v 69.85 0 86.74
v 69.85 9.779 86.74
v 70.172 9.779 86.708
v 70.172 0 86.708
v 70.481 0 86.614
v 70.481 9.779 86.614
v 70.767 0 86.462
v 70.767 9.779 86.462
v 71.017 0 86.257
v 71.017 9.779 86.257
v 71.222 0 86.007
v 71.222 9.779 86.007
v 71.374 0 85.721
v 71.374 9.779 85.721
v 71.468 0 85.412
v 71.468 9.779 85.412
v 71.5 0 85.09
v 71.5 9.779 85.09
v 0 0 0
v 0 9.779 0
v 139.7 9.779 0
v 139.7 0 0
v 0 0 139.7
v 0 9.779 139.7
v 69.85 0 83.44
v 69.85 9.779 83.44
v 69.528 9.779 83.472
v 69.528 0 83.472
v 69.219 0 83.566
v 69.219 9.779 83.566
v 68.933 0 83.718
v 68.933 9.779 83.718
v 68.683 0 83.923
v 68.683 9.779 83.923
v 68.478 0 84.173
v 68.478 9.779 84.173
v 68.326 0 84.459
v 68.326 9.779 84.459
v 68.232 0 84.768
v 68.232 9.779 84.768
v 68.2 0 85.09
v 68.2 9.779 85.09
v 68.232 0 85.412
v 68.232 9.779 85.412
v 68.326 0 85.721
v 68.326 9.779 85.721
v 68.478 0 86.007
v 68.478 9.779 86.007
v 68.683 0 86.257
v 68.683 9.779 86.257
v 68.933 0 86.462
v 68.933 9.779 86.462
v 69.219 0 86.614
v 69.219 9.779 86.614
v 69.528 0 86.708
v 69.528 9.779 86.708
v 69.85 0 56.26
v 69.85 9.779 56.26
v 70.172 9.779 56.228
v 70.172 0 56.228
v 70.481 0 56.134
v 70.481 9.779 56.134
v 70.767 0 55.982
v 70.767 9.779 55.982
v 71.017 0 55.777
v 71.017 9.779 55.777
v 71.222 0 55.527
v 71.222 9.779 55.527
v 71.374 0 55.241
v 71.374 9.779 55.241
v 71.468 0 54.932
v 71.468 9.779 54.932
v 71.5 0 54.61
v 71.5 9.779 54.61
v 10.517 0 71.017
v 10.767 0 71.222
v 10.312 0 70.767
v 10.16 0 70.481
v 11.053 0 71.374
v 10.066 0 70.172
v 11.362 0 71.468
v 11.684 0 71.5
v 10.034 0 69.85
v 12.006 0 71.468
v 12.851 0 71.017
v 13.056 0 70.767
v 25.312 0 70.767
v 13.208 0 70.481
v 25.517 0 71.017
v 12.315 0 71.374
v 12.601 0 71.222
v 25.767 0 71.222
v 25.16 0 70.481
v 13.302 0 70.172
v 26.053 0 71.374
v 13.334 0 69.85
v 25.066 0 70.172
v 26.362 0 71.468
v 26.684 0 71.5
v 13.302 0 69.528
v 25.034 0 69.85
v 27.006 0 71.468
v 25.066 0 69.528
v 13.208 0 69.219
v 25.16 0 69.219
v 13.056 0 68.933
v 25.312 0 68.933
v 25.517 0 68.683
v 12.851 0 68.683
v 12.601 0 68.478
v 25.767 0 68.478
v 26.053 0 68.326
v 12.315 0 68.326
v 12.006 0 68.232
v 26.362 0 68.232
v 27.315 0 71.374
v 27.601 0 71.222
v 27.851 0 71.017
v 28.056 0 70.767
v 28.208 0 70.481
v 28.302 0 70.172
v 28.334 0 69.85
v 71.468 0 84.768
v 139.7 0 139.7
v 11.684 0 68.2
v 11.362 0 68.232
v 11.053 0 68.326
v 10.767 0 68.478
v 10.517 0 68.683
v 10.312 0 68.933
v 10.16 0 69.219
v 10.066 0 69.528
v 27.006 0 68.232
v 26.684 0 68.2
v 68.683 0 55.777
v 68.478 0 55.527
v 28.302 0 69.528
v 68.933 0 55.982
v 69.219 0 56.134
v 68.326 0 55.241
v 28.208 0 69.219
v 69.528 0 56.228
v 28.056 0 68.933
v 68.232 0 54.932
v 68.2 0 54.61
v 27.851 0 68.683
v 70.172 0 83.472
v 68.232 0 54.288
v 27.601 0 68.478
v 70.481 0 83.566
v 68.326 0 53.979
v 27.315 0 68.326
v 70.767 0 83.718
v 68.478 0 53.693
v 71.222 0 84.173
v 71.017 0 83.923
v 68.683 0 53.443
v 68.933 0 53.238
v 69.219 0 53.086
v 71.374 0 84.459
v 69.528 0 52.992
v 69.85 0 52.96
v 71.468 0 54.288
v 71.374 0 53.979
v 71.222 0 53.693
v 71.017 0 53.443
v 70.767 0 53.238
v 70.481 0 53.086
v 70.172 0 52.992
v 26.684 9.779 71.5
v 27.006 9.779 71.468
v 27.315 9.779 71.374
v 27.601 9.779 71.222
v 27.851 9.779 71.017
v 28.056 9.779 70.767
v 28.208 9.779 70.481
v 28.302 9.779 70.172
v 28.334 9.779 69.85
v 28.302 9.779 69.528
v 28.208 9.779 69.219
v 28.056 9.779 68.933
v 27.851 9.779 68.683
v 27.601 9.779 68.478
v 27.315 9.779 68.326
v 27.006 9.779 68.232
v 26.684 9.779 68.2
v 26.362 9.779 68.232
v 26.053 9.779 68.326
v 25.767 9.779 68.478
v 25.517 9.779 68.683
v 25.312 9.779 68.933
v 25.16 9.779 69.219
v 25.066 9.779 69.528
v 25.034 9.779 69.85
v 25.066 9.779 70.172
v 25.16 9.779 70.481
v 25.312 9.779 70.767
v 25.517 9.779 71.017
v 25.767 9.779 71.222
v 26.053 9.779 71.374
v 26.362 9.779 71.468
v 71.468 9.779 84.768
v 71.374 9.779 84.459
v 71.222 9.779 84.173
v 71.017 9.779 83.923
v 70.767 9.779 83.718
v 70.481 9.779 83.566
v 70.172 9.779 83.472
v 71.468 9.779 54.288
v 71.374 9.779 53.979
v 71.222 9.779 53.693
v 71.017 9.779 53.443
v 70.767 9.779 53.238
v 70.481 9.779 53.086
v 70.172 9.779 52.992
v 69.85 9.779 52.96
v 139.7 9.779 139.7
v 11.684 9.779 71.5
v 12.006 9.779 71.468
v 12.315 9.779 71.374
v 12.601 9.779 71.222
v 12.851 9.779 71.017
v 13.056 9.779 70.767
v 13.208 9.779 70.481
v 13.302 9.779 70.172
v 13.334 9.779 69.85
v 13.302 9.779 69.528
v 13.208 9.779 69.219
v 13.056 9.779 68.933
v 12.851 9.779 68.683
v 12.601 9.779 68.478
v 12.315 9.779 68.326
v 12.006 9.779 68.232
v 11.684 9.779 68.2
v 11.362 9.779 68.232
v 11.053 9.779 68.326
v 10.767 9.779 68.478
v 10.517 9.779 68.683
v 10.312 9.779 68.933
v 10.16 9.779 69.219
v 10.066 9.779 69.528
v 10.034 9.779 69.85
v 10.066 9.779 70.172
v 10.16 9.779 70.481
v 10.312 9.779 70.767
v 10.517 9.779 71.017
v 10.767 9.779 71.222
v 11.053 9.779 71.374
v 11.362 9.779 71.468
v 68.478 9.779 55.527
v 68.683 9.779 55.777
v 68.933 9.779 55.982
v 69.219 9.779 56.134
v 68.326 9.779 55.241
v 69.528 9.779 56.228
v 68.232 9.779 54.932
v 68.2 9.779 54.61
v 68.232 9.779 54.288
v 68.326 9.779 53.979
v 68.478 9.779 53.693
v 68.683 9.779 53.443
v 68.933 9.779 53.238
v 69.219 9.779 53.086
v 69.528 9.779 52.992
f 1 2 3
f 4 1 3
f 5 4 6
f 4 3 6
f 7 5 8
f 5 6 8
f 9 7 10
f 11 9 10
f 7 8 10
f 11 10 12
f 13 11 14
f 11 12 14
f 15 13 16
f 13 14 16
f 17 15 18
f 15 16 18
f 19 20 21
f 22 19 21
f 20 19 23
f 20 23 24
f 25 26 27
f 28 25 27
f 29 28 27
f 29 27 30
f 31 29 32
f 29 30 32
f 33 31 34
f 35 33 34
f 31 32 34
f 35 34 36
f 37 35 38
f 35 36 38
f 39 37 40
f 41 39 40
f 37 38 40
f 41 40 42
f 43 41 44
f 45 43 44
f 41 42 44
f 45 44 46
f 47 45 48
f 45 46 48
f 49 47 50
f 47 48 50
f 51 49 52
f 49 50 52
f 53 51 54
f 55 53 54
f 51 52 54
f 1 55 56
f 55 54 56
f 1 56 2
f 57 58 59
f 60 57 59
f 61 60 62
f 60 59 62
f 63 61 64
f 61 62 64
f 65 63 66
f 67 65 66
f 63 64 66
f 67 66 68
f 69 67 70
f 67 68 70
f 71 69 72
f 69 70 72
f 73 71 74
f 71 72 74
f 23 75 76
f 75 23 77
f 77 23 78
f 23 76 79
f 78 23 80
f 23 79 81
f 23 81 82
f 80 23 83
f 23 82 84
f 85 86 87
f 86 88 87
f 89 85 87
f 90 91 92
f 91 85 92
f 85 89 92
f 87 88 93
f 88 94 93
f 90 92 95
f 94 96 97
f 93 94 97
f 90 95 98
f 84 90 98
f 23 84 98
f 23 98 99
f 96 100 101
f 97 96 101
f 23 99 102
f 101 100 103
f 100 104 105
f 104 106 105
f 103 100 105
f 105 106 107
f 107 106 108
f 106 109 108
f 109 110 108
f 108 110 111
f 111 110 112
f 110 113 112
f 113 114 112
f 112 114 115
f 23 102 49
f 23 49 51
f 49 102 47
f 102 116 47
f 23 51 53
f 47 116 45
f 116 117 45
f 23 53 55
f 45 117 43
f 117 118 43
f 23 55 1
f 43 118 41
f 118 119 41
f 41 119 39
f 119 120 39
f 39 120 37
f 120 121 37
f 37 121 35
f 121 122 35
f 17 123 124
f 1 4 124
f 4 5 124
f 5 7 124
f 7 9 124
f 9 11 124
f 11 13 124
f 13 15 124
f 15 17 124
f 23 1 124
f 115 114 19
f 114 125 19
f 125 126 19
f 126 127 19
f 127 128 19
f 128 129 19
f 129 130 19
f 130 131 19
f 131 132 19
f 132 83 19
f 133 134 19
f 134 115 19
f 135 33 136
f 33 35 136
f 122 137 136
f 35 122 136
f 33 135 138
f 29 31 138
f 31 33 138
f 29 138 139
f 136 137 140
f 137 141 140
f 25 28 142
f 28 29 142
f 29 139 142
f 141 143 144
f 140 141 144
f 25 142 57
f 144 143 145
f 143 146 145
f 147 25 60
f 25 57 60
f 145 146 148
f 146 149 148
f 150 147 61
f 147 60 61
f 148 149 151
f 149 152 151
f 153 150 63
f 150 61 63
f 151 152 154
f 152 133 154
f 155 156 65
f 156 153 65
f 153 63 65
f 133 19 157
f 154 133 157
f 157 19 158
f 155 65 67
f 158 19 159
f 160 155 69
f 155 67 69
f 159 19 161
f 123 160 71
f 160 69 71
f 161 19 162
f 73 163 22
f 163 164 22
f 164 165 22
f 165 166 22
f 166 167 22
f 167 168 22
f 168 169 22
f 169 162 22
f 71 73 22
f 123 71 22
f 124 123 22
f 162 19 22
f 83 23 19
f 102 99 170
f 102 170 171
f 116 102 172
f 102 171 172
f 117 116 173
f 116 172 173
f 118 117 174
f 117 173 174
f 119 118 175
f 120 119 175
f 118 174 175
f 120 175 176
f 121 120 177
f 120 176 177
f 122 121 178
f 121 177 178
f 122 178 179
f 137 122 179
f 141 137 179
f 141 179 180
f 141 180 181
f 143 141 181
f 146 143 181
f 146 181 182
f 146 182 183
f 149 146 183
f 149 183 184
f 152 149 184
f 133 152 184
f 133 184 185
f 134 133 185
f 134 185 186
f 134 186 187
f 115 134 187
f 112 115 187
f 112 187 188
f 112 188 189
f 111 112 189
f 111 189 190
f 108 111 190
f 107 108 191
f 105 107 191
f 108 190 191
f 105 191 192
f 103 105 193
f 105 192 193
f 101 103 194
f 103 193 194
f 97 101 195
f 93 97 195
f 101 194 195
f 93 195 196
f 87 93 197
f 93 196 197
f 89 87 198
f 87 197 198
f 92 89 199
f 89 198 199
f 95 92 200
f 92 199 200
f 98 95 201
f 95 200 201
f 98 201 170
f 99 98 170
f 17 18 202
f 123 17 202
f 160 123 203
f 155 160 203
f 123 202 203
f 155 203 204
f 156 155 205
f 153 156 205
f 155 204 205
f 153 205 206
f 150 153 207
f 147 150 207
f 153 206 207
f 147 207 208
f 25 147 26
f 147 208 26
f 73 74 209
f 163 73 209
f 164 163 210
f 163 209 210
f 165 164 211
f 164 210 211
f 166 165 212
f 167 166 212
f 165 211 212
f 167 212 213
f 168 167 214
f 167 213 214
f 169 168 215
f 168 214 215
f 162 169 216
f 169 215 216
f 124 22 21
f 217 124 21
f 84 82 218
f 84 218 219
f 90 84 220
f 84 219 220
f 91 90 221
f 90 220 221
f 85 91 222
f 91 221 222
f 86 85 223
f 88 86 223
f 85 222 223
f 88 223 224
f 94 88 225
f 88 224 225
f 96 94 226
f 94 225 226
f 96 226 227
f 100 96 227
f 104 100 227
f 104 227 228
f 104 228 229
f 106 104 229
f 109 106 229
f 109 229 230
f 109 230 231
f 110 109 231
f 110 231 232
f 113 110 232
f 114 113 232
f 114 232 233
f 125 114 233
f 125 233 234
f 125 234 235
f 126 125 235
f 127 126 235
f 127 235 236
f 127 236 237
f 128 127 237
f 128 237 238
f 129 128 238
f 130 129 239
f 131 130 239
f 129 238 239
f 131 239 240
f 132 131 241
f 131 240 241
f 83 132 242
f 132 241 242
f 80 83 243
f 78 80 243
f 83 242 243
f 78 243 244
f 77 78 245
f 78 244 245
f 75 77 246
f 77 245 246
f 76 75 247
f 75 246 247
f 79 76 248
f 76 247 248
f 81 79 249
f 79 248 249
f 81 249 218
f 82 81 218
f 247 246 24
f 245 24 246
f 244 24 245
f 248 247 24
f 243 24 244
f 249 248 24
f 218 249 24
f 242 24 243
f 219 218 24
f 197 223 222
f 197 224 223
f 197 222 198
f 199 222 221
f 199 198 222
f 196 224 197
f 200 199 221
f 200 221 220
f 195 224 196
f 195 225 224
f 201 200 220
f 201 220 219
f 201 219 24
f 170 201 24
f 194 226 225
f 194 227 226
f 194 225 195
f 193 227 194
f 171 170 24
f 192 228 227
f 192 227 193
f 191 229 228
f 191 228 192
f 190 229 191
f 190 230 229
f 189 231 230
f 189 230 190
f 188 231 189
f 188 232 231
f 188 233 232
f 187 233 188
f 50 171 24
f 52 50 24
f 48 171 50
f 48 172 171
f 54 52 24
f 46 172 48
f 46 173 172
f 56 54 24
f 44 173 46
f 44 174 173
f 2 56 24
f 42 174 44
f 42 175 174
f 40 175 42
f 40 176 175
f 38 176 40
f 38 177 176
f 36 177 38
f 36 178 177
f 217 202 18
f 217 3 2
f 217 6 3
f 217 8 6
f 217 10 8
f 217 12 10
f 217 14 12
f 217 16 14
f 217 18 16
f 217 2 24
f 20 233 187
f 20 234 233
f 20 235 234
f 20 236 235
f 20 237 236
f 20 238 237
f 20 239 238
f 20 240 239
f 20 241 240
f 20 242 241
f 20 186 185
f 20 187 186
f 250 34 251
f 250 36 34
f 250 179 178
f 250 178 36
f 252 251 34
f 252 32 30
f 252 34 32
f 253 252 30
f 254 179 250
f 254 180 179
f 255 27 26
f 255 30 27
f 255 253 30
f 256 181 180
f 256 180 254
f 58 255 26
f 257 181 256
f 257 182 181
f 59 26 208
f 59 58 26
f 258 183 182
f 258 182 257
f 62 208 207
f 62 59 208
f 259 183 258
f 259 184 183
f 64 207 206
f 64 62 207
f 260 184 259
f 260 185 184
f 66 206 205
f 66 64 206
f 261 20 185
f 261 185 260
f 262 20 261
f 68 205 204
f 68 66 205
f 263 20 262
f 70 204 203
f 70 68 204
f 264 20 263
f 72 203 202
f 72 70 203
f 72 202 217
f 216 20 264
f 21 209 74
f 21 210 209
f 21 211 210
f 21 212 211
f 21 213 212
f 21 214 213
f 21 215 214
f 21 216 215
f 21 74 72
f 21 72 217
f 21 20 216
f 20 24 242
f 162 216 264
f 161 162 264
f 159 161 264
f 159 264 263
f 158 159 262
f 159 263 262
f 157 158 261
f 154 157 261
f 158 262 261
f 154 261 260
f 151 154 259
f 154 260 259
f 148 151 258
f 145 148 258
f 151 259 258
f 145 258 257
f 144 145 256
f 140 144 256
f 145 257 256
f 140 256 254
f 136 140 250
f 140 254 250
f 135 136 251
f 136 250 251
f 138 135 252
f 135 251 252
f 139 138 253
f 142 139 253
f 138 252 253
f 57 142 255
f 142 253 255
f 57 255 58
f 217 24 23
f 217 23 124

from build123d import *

# Parameters (mm, degrees)
SKETCH1_W           = 139.7
SKETCH1_H           = 9.779
BOSS_EXTRUDE1_DEPTH = 139.7
SKETCH2_R           = 1.65
CUT_EXTRUDE1_DEPTH  = 198.807504511
CUT_EXTRUDE2_DEPTH  = 198.807504511


with BuildPart() as part:
    # Sketch1 → Boss-Extrude1 (new body)
    with BuildSketch(Plane.XY):
        with Locations((69.85, 4.8895)):
            Rectangle(SKETCH1_W, SKETCH1_H)
    extrude(amount=BOSS_EXTRUDE1_DEPTH)

    # Sketch2 → Cut-Extrude1 (cut, through all)
    with BuildSketch(Plane(origin=(0, 9.779, 0), x_dir=(1, 0, 0), z_dir=(0, 1, 0))):
        with Locations(Location((11.684, -69.85, 0), (0, 0, 270))):
            Circle(SKETCH2_R)
        with Locations(Location((26.684, -69.85, 0), (0, 0, 270))):
            Circle(SKETCH2_R)
    extrude(amount=-CUT_EXTRUDE1_DEPTH, mode=Mode.SUBTRACT)

    # Sketch3 → Cut-Extrude2 (cut, through all)
    with BuildSketch(Plane(origin=(0, 9.779, 0), x_dir=(1, 0, 0), z_dir=(0, 1, 0))):
        with BuildLine():
            ThreePointArc((71.5, -54.61), (71.016726189, -53.443273811), (69.85, -52.96))
            Line((69.85, -52.96), (69.85, -54.61))
            Line((69.85, -54.61), (69.85, -56.26))
            ThreePointArc((69.85, -56.26), (71.016726189, -55.776726189), (71.5, -54.61))
        make_face()
        with BuildLine():
            Line((69.85, -54.61), (69.85, -52.96))
            ThreePointArc((69.85, -52.96), (68.2, -54.61), (69.85, -56.26))
            Line((69.85, -56.26), (69.85, -54.61))
        make_face()
        with BuildLine():
            ThreePointArc((71.5, -85.09), (71.016726189, -83.923273811), (69.85, -83.44))
            Line((69.85, -83.44), (69.85, -85.09))
            Line((69.85, -85.09), (69.85, -86.74))
            ThreePointArc((69.85, -86.74), (71.016726189, -86.256726189), (71.5, -85.09))
        make_face()
        with BuildLine():
            Line((69.85, -85.09), (69.85, -83.44))
            ThreePointArc((69.85, -83.44), (68.2, -85.09), (69.85, -86.74))
            Line((69.85, -86.74), (69.85, -85.09))
        make_face()
    extrude(amount=-CUT_EXTRUDE2_DEPTH, mode=Mode.SUBTRACT)


solid = part.part
